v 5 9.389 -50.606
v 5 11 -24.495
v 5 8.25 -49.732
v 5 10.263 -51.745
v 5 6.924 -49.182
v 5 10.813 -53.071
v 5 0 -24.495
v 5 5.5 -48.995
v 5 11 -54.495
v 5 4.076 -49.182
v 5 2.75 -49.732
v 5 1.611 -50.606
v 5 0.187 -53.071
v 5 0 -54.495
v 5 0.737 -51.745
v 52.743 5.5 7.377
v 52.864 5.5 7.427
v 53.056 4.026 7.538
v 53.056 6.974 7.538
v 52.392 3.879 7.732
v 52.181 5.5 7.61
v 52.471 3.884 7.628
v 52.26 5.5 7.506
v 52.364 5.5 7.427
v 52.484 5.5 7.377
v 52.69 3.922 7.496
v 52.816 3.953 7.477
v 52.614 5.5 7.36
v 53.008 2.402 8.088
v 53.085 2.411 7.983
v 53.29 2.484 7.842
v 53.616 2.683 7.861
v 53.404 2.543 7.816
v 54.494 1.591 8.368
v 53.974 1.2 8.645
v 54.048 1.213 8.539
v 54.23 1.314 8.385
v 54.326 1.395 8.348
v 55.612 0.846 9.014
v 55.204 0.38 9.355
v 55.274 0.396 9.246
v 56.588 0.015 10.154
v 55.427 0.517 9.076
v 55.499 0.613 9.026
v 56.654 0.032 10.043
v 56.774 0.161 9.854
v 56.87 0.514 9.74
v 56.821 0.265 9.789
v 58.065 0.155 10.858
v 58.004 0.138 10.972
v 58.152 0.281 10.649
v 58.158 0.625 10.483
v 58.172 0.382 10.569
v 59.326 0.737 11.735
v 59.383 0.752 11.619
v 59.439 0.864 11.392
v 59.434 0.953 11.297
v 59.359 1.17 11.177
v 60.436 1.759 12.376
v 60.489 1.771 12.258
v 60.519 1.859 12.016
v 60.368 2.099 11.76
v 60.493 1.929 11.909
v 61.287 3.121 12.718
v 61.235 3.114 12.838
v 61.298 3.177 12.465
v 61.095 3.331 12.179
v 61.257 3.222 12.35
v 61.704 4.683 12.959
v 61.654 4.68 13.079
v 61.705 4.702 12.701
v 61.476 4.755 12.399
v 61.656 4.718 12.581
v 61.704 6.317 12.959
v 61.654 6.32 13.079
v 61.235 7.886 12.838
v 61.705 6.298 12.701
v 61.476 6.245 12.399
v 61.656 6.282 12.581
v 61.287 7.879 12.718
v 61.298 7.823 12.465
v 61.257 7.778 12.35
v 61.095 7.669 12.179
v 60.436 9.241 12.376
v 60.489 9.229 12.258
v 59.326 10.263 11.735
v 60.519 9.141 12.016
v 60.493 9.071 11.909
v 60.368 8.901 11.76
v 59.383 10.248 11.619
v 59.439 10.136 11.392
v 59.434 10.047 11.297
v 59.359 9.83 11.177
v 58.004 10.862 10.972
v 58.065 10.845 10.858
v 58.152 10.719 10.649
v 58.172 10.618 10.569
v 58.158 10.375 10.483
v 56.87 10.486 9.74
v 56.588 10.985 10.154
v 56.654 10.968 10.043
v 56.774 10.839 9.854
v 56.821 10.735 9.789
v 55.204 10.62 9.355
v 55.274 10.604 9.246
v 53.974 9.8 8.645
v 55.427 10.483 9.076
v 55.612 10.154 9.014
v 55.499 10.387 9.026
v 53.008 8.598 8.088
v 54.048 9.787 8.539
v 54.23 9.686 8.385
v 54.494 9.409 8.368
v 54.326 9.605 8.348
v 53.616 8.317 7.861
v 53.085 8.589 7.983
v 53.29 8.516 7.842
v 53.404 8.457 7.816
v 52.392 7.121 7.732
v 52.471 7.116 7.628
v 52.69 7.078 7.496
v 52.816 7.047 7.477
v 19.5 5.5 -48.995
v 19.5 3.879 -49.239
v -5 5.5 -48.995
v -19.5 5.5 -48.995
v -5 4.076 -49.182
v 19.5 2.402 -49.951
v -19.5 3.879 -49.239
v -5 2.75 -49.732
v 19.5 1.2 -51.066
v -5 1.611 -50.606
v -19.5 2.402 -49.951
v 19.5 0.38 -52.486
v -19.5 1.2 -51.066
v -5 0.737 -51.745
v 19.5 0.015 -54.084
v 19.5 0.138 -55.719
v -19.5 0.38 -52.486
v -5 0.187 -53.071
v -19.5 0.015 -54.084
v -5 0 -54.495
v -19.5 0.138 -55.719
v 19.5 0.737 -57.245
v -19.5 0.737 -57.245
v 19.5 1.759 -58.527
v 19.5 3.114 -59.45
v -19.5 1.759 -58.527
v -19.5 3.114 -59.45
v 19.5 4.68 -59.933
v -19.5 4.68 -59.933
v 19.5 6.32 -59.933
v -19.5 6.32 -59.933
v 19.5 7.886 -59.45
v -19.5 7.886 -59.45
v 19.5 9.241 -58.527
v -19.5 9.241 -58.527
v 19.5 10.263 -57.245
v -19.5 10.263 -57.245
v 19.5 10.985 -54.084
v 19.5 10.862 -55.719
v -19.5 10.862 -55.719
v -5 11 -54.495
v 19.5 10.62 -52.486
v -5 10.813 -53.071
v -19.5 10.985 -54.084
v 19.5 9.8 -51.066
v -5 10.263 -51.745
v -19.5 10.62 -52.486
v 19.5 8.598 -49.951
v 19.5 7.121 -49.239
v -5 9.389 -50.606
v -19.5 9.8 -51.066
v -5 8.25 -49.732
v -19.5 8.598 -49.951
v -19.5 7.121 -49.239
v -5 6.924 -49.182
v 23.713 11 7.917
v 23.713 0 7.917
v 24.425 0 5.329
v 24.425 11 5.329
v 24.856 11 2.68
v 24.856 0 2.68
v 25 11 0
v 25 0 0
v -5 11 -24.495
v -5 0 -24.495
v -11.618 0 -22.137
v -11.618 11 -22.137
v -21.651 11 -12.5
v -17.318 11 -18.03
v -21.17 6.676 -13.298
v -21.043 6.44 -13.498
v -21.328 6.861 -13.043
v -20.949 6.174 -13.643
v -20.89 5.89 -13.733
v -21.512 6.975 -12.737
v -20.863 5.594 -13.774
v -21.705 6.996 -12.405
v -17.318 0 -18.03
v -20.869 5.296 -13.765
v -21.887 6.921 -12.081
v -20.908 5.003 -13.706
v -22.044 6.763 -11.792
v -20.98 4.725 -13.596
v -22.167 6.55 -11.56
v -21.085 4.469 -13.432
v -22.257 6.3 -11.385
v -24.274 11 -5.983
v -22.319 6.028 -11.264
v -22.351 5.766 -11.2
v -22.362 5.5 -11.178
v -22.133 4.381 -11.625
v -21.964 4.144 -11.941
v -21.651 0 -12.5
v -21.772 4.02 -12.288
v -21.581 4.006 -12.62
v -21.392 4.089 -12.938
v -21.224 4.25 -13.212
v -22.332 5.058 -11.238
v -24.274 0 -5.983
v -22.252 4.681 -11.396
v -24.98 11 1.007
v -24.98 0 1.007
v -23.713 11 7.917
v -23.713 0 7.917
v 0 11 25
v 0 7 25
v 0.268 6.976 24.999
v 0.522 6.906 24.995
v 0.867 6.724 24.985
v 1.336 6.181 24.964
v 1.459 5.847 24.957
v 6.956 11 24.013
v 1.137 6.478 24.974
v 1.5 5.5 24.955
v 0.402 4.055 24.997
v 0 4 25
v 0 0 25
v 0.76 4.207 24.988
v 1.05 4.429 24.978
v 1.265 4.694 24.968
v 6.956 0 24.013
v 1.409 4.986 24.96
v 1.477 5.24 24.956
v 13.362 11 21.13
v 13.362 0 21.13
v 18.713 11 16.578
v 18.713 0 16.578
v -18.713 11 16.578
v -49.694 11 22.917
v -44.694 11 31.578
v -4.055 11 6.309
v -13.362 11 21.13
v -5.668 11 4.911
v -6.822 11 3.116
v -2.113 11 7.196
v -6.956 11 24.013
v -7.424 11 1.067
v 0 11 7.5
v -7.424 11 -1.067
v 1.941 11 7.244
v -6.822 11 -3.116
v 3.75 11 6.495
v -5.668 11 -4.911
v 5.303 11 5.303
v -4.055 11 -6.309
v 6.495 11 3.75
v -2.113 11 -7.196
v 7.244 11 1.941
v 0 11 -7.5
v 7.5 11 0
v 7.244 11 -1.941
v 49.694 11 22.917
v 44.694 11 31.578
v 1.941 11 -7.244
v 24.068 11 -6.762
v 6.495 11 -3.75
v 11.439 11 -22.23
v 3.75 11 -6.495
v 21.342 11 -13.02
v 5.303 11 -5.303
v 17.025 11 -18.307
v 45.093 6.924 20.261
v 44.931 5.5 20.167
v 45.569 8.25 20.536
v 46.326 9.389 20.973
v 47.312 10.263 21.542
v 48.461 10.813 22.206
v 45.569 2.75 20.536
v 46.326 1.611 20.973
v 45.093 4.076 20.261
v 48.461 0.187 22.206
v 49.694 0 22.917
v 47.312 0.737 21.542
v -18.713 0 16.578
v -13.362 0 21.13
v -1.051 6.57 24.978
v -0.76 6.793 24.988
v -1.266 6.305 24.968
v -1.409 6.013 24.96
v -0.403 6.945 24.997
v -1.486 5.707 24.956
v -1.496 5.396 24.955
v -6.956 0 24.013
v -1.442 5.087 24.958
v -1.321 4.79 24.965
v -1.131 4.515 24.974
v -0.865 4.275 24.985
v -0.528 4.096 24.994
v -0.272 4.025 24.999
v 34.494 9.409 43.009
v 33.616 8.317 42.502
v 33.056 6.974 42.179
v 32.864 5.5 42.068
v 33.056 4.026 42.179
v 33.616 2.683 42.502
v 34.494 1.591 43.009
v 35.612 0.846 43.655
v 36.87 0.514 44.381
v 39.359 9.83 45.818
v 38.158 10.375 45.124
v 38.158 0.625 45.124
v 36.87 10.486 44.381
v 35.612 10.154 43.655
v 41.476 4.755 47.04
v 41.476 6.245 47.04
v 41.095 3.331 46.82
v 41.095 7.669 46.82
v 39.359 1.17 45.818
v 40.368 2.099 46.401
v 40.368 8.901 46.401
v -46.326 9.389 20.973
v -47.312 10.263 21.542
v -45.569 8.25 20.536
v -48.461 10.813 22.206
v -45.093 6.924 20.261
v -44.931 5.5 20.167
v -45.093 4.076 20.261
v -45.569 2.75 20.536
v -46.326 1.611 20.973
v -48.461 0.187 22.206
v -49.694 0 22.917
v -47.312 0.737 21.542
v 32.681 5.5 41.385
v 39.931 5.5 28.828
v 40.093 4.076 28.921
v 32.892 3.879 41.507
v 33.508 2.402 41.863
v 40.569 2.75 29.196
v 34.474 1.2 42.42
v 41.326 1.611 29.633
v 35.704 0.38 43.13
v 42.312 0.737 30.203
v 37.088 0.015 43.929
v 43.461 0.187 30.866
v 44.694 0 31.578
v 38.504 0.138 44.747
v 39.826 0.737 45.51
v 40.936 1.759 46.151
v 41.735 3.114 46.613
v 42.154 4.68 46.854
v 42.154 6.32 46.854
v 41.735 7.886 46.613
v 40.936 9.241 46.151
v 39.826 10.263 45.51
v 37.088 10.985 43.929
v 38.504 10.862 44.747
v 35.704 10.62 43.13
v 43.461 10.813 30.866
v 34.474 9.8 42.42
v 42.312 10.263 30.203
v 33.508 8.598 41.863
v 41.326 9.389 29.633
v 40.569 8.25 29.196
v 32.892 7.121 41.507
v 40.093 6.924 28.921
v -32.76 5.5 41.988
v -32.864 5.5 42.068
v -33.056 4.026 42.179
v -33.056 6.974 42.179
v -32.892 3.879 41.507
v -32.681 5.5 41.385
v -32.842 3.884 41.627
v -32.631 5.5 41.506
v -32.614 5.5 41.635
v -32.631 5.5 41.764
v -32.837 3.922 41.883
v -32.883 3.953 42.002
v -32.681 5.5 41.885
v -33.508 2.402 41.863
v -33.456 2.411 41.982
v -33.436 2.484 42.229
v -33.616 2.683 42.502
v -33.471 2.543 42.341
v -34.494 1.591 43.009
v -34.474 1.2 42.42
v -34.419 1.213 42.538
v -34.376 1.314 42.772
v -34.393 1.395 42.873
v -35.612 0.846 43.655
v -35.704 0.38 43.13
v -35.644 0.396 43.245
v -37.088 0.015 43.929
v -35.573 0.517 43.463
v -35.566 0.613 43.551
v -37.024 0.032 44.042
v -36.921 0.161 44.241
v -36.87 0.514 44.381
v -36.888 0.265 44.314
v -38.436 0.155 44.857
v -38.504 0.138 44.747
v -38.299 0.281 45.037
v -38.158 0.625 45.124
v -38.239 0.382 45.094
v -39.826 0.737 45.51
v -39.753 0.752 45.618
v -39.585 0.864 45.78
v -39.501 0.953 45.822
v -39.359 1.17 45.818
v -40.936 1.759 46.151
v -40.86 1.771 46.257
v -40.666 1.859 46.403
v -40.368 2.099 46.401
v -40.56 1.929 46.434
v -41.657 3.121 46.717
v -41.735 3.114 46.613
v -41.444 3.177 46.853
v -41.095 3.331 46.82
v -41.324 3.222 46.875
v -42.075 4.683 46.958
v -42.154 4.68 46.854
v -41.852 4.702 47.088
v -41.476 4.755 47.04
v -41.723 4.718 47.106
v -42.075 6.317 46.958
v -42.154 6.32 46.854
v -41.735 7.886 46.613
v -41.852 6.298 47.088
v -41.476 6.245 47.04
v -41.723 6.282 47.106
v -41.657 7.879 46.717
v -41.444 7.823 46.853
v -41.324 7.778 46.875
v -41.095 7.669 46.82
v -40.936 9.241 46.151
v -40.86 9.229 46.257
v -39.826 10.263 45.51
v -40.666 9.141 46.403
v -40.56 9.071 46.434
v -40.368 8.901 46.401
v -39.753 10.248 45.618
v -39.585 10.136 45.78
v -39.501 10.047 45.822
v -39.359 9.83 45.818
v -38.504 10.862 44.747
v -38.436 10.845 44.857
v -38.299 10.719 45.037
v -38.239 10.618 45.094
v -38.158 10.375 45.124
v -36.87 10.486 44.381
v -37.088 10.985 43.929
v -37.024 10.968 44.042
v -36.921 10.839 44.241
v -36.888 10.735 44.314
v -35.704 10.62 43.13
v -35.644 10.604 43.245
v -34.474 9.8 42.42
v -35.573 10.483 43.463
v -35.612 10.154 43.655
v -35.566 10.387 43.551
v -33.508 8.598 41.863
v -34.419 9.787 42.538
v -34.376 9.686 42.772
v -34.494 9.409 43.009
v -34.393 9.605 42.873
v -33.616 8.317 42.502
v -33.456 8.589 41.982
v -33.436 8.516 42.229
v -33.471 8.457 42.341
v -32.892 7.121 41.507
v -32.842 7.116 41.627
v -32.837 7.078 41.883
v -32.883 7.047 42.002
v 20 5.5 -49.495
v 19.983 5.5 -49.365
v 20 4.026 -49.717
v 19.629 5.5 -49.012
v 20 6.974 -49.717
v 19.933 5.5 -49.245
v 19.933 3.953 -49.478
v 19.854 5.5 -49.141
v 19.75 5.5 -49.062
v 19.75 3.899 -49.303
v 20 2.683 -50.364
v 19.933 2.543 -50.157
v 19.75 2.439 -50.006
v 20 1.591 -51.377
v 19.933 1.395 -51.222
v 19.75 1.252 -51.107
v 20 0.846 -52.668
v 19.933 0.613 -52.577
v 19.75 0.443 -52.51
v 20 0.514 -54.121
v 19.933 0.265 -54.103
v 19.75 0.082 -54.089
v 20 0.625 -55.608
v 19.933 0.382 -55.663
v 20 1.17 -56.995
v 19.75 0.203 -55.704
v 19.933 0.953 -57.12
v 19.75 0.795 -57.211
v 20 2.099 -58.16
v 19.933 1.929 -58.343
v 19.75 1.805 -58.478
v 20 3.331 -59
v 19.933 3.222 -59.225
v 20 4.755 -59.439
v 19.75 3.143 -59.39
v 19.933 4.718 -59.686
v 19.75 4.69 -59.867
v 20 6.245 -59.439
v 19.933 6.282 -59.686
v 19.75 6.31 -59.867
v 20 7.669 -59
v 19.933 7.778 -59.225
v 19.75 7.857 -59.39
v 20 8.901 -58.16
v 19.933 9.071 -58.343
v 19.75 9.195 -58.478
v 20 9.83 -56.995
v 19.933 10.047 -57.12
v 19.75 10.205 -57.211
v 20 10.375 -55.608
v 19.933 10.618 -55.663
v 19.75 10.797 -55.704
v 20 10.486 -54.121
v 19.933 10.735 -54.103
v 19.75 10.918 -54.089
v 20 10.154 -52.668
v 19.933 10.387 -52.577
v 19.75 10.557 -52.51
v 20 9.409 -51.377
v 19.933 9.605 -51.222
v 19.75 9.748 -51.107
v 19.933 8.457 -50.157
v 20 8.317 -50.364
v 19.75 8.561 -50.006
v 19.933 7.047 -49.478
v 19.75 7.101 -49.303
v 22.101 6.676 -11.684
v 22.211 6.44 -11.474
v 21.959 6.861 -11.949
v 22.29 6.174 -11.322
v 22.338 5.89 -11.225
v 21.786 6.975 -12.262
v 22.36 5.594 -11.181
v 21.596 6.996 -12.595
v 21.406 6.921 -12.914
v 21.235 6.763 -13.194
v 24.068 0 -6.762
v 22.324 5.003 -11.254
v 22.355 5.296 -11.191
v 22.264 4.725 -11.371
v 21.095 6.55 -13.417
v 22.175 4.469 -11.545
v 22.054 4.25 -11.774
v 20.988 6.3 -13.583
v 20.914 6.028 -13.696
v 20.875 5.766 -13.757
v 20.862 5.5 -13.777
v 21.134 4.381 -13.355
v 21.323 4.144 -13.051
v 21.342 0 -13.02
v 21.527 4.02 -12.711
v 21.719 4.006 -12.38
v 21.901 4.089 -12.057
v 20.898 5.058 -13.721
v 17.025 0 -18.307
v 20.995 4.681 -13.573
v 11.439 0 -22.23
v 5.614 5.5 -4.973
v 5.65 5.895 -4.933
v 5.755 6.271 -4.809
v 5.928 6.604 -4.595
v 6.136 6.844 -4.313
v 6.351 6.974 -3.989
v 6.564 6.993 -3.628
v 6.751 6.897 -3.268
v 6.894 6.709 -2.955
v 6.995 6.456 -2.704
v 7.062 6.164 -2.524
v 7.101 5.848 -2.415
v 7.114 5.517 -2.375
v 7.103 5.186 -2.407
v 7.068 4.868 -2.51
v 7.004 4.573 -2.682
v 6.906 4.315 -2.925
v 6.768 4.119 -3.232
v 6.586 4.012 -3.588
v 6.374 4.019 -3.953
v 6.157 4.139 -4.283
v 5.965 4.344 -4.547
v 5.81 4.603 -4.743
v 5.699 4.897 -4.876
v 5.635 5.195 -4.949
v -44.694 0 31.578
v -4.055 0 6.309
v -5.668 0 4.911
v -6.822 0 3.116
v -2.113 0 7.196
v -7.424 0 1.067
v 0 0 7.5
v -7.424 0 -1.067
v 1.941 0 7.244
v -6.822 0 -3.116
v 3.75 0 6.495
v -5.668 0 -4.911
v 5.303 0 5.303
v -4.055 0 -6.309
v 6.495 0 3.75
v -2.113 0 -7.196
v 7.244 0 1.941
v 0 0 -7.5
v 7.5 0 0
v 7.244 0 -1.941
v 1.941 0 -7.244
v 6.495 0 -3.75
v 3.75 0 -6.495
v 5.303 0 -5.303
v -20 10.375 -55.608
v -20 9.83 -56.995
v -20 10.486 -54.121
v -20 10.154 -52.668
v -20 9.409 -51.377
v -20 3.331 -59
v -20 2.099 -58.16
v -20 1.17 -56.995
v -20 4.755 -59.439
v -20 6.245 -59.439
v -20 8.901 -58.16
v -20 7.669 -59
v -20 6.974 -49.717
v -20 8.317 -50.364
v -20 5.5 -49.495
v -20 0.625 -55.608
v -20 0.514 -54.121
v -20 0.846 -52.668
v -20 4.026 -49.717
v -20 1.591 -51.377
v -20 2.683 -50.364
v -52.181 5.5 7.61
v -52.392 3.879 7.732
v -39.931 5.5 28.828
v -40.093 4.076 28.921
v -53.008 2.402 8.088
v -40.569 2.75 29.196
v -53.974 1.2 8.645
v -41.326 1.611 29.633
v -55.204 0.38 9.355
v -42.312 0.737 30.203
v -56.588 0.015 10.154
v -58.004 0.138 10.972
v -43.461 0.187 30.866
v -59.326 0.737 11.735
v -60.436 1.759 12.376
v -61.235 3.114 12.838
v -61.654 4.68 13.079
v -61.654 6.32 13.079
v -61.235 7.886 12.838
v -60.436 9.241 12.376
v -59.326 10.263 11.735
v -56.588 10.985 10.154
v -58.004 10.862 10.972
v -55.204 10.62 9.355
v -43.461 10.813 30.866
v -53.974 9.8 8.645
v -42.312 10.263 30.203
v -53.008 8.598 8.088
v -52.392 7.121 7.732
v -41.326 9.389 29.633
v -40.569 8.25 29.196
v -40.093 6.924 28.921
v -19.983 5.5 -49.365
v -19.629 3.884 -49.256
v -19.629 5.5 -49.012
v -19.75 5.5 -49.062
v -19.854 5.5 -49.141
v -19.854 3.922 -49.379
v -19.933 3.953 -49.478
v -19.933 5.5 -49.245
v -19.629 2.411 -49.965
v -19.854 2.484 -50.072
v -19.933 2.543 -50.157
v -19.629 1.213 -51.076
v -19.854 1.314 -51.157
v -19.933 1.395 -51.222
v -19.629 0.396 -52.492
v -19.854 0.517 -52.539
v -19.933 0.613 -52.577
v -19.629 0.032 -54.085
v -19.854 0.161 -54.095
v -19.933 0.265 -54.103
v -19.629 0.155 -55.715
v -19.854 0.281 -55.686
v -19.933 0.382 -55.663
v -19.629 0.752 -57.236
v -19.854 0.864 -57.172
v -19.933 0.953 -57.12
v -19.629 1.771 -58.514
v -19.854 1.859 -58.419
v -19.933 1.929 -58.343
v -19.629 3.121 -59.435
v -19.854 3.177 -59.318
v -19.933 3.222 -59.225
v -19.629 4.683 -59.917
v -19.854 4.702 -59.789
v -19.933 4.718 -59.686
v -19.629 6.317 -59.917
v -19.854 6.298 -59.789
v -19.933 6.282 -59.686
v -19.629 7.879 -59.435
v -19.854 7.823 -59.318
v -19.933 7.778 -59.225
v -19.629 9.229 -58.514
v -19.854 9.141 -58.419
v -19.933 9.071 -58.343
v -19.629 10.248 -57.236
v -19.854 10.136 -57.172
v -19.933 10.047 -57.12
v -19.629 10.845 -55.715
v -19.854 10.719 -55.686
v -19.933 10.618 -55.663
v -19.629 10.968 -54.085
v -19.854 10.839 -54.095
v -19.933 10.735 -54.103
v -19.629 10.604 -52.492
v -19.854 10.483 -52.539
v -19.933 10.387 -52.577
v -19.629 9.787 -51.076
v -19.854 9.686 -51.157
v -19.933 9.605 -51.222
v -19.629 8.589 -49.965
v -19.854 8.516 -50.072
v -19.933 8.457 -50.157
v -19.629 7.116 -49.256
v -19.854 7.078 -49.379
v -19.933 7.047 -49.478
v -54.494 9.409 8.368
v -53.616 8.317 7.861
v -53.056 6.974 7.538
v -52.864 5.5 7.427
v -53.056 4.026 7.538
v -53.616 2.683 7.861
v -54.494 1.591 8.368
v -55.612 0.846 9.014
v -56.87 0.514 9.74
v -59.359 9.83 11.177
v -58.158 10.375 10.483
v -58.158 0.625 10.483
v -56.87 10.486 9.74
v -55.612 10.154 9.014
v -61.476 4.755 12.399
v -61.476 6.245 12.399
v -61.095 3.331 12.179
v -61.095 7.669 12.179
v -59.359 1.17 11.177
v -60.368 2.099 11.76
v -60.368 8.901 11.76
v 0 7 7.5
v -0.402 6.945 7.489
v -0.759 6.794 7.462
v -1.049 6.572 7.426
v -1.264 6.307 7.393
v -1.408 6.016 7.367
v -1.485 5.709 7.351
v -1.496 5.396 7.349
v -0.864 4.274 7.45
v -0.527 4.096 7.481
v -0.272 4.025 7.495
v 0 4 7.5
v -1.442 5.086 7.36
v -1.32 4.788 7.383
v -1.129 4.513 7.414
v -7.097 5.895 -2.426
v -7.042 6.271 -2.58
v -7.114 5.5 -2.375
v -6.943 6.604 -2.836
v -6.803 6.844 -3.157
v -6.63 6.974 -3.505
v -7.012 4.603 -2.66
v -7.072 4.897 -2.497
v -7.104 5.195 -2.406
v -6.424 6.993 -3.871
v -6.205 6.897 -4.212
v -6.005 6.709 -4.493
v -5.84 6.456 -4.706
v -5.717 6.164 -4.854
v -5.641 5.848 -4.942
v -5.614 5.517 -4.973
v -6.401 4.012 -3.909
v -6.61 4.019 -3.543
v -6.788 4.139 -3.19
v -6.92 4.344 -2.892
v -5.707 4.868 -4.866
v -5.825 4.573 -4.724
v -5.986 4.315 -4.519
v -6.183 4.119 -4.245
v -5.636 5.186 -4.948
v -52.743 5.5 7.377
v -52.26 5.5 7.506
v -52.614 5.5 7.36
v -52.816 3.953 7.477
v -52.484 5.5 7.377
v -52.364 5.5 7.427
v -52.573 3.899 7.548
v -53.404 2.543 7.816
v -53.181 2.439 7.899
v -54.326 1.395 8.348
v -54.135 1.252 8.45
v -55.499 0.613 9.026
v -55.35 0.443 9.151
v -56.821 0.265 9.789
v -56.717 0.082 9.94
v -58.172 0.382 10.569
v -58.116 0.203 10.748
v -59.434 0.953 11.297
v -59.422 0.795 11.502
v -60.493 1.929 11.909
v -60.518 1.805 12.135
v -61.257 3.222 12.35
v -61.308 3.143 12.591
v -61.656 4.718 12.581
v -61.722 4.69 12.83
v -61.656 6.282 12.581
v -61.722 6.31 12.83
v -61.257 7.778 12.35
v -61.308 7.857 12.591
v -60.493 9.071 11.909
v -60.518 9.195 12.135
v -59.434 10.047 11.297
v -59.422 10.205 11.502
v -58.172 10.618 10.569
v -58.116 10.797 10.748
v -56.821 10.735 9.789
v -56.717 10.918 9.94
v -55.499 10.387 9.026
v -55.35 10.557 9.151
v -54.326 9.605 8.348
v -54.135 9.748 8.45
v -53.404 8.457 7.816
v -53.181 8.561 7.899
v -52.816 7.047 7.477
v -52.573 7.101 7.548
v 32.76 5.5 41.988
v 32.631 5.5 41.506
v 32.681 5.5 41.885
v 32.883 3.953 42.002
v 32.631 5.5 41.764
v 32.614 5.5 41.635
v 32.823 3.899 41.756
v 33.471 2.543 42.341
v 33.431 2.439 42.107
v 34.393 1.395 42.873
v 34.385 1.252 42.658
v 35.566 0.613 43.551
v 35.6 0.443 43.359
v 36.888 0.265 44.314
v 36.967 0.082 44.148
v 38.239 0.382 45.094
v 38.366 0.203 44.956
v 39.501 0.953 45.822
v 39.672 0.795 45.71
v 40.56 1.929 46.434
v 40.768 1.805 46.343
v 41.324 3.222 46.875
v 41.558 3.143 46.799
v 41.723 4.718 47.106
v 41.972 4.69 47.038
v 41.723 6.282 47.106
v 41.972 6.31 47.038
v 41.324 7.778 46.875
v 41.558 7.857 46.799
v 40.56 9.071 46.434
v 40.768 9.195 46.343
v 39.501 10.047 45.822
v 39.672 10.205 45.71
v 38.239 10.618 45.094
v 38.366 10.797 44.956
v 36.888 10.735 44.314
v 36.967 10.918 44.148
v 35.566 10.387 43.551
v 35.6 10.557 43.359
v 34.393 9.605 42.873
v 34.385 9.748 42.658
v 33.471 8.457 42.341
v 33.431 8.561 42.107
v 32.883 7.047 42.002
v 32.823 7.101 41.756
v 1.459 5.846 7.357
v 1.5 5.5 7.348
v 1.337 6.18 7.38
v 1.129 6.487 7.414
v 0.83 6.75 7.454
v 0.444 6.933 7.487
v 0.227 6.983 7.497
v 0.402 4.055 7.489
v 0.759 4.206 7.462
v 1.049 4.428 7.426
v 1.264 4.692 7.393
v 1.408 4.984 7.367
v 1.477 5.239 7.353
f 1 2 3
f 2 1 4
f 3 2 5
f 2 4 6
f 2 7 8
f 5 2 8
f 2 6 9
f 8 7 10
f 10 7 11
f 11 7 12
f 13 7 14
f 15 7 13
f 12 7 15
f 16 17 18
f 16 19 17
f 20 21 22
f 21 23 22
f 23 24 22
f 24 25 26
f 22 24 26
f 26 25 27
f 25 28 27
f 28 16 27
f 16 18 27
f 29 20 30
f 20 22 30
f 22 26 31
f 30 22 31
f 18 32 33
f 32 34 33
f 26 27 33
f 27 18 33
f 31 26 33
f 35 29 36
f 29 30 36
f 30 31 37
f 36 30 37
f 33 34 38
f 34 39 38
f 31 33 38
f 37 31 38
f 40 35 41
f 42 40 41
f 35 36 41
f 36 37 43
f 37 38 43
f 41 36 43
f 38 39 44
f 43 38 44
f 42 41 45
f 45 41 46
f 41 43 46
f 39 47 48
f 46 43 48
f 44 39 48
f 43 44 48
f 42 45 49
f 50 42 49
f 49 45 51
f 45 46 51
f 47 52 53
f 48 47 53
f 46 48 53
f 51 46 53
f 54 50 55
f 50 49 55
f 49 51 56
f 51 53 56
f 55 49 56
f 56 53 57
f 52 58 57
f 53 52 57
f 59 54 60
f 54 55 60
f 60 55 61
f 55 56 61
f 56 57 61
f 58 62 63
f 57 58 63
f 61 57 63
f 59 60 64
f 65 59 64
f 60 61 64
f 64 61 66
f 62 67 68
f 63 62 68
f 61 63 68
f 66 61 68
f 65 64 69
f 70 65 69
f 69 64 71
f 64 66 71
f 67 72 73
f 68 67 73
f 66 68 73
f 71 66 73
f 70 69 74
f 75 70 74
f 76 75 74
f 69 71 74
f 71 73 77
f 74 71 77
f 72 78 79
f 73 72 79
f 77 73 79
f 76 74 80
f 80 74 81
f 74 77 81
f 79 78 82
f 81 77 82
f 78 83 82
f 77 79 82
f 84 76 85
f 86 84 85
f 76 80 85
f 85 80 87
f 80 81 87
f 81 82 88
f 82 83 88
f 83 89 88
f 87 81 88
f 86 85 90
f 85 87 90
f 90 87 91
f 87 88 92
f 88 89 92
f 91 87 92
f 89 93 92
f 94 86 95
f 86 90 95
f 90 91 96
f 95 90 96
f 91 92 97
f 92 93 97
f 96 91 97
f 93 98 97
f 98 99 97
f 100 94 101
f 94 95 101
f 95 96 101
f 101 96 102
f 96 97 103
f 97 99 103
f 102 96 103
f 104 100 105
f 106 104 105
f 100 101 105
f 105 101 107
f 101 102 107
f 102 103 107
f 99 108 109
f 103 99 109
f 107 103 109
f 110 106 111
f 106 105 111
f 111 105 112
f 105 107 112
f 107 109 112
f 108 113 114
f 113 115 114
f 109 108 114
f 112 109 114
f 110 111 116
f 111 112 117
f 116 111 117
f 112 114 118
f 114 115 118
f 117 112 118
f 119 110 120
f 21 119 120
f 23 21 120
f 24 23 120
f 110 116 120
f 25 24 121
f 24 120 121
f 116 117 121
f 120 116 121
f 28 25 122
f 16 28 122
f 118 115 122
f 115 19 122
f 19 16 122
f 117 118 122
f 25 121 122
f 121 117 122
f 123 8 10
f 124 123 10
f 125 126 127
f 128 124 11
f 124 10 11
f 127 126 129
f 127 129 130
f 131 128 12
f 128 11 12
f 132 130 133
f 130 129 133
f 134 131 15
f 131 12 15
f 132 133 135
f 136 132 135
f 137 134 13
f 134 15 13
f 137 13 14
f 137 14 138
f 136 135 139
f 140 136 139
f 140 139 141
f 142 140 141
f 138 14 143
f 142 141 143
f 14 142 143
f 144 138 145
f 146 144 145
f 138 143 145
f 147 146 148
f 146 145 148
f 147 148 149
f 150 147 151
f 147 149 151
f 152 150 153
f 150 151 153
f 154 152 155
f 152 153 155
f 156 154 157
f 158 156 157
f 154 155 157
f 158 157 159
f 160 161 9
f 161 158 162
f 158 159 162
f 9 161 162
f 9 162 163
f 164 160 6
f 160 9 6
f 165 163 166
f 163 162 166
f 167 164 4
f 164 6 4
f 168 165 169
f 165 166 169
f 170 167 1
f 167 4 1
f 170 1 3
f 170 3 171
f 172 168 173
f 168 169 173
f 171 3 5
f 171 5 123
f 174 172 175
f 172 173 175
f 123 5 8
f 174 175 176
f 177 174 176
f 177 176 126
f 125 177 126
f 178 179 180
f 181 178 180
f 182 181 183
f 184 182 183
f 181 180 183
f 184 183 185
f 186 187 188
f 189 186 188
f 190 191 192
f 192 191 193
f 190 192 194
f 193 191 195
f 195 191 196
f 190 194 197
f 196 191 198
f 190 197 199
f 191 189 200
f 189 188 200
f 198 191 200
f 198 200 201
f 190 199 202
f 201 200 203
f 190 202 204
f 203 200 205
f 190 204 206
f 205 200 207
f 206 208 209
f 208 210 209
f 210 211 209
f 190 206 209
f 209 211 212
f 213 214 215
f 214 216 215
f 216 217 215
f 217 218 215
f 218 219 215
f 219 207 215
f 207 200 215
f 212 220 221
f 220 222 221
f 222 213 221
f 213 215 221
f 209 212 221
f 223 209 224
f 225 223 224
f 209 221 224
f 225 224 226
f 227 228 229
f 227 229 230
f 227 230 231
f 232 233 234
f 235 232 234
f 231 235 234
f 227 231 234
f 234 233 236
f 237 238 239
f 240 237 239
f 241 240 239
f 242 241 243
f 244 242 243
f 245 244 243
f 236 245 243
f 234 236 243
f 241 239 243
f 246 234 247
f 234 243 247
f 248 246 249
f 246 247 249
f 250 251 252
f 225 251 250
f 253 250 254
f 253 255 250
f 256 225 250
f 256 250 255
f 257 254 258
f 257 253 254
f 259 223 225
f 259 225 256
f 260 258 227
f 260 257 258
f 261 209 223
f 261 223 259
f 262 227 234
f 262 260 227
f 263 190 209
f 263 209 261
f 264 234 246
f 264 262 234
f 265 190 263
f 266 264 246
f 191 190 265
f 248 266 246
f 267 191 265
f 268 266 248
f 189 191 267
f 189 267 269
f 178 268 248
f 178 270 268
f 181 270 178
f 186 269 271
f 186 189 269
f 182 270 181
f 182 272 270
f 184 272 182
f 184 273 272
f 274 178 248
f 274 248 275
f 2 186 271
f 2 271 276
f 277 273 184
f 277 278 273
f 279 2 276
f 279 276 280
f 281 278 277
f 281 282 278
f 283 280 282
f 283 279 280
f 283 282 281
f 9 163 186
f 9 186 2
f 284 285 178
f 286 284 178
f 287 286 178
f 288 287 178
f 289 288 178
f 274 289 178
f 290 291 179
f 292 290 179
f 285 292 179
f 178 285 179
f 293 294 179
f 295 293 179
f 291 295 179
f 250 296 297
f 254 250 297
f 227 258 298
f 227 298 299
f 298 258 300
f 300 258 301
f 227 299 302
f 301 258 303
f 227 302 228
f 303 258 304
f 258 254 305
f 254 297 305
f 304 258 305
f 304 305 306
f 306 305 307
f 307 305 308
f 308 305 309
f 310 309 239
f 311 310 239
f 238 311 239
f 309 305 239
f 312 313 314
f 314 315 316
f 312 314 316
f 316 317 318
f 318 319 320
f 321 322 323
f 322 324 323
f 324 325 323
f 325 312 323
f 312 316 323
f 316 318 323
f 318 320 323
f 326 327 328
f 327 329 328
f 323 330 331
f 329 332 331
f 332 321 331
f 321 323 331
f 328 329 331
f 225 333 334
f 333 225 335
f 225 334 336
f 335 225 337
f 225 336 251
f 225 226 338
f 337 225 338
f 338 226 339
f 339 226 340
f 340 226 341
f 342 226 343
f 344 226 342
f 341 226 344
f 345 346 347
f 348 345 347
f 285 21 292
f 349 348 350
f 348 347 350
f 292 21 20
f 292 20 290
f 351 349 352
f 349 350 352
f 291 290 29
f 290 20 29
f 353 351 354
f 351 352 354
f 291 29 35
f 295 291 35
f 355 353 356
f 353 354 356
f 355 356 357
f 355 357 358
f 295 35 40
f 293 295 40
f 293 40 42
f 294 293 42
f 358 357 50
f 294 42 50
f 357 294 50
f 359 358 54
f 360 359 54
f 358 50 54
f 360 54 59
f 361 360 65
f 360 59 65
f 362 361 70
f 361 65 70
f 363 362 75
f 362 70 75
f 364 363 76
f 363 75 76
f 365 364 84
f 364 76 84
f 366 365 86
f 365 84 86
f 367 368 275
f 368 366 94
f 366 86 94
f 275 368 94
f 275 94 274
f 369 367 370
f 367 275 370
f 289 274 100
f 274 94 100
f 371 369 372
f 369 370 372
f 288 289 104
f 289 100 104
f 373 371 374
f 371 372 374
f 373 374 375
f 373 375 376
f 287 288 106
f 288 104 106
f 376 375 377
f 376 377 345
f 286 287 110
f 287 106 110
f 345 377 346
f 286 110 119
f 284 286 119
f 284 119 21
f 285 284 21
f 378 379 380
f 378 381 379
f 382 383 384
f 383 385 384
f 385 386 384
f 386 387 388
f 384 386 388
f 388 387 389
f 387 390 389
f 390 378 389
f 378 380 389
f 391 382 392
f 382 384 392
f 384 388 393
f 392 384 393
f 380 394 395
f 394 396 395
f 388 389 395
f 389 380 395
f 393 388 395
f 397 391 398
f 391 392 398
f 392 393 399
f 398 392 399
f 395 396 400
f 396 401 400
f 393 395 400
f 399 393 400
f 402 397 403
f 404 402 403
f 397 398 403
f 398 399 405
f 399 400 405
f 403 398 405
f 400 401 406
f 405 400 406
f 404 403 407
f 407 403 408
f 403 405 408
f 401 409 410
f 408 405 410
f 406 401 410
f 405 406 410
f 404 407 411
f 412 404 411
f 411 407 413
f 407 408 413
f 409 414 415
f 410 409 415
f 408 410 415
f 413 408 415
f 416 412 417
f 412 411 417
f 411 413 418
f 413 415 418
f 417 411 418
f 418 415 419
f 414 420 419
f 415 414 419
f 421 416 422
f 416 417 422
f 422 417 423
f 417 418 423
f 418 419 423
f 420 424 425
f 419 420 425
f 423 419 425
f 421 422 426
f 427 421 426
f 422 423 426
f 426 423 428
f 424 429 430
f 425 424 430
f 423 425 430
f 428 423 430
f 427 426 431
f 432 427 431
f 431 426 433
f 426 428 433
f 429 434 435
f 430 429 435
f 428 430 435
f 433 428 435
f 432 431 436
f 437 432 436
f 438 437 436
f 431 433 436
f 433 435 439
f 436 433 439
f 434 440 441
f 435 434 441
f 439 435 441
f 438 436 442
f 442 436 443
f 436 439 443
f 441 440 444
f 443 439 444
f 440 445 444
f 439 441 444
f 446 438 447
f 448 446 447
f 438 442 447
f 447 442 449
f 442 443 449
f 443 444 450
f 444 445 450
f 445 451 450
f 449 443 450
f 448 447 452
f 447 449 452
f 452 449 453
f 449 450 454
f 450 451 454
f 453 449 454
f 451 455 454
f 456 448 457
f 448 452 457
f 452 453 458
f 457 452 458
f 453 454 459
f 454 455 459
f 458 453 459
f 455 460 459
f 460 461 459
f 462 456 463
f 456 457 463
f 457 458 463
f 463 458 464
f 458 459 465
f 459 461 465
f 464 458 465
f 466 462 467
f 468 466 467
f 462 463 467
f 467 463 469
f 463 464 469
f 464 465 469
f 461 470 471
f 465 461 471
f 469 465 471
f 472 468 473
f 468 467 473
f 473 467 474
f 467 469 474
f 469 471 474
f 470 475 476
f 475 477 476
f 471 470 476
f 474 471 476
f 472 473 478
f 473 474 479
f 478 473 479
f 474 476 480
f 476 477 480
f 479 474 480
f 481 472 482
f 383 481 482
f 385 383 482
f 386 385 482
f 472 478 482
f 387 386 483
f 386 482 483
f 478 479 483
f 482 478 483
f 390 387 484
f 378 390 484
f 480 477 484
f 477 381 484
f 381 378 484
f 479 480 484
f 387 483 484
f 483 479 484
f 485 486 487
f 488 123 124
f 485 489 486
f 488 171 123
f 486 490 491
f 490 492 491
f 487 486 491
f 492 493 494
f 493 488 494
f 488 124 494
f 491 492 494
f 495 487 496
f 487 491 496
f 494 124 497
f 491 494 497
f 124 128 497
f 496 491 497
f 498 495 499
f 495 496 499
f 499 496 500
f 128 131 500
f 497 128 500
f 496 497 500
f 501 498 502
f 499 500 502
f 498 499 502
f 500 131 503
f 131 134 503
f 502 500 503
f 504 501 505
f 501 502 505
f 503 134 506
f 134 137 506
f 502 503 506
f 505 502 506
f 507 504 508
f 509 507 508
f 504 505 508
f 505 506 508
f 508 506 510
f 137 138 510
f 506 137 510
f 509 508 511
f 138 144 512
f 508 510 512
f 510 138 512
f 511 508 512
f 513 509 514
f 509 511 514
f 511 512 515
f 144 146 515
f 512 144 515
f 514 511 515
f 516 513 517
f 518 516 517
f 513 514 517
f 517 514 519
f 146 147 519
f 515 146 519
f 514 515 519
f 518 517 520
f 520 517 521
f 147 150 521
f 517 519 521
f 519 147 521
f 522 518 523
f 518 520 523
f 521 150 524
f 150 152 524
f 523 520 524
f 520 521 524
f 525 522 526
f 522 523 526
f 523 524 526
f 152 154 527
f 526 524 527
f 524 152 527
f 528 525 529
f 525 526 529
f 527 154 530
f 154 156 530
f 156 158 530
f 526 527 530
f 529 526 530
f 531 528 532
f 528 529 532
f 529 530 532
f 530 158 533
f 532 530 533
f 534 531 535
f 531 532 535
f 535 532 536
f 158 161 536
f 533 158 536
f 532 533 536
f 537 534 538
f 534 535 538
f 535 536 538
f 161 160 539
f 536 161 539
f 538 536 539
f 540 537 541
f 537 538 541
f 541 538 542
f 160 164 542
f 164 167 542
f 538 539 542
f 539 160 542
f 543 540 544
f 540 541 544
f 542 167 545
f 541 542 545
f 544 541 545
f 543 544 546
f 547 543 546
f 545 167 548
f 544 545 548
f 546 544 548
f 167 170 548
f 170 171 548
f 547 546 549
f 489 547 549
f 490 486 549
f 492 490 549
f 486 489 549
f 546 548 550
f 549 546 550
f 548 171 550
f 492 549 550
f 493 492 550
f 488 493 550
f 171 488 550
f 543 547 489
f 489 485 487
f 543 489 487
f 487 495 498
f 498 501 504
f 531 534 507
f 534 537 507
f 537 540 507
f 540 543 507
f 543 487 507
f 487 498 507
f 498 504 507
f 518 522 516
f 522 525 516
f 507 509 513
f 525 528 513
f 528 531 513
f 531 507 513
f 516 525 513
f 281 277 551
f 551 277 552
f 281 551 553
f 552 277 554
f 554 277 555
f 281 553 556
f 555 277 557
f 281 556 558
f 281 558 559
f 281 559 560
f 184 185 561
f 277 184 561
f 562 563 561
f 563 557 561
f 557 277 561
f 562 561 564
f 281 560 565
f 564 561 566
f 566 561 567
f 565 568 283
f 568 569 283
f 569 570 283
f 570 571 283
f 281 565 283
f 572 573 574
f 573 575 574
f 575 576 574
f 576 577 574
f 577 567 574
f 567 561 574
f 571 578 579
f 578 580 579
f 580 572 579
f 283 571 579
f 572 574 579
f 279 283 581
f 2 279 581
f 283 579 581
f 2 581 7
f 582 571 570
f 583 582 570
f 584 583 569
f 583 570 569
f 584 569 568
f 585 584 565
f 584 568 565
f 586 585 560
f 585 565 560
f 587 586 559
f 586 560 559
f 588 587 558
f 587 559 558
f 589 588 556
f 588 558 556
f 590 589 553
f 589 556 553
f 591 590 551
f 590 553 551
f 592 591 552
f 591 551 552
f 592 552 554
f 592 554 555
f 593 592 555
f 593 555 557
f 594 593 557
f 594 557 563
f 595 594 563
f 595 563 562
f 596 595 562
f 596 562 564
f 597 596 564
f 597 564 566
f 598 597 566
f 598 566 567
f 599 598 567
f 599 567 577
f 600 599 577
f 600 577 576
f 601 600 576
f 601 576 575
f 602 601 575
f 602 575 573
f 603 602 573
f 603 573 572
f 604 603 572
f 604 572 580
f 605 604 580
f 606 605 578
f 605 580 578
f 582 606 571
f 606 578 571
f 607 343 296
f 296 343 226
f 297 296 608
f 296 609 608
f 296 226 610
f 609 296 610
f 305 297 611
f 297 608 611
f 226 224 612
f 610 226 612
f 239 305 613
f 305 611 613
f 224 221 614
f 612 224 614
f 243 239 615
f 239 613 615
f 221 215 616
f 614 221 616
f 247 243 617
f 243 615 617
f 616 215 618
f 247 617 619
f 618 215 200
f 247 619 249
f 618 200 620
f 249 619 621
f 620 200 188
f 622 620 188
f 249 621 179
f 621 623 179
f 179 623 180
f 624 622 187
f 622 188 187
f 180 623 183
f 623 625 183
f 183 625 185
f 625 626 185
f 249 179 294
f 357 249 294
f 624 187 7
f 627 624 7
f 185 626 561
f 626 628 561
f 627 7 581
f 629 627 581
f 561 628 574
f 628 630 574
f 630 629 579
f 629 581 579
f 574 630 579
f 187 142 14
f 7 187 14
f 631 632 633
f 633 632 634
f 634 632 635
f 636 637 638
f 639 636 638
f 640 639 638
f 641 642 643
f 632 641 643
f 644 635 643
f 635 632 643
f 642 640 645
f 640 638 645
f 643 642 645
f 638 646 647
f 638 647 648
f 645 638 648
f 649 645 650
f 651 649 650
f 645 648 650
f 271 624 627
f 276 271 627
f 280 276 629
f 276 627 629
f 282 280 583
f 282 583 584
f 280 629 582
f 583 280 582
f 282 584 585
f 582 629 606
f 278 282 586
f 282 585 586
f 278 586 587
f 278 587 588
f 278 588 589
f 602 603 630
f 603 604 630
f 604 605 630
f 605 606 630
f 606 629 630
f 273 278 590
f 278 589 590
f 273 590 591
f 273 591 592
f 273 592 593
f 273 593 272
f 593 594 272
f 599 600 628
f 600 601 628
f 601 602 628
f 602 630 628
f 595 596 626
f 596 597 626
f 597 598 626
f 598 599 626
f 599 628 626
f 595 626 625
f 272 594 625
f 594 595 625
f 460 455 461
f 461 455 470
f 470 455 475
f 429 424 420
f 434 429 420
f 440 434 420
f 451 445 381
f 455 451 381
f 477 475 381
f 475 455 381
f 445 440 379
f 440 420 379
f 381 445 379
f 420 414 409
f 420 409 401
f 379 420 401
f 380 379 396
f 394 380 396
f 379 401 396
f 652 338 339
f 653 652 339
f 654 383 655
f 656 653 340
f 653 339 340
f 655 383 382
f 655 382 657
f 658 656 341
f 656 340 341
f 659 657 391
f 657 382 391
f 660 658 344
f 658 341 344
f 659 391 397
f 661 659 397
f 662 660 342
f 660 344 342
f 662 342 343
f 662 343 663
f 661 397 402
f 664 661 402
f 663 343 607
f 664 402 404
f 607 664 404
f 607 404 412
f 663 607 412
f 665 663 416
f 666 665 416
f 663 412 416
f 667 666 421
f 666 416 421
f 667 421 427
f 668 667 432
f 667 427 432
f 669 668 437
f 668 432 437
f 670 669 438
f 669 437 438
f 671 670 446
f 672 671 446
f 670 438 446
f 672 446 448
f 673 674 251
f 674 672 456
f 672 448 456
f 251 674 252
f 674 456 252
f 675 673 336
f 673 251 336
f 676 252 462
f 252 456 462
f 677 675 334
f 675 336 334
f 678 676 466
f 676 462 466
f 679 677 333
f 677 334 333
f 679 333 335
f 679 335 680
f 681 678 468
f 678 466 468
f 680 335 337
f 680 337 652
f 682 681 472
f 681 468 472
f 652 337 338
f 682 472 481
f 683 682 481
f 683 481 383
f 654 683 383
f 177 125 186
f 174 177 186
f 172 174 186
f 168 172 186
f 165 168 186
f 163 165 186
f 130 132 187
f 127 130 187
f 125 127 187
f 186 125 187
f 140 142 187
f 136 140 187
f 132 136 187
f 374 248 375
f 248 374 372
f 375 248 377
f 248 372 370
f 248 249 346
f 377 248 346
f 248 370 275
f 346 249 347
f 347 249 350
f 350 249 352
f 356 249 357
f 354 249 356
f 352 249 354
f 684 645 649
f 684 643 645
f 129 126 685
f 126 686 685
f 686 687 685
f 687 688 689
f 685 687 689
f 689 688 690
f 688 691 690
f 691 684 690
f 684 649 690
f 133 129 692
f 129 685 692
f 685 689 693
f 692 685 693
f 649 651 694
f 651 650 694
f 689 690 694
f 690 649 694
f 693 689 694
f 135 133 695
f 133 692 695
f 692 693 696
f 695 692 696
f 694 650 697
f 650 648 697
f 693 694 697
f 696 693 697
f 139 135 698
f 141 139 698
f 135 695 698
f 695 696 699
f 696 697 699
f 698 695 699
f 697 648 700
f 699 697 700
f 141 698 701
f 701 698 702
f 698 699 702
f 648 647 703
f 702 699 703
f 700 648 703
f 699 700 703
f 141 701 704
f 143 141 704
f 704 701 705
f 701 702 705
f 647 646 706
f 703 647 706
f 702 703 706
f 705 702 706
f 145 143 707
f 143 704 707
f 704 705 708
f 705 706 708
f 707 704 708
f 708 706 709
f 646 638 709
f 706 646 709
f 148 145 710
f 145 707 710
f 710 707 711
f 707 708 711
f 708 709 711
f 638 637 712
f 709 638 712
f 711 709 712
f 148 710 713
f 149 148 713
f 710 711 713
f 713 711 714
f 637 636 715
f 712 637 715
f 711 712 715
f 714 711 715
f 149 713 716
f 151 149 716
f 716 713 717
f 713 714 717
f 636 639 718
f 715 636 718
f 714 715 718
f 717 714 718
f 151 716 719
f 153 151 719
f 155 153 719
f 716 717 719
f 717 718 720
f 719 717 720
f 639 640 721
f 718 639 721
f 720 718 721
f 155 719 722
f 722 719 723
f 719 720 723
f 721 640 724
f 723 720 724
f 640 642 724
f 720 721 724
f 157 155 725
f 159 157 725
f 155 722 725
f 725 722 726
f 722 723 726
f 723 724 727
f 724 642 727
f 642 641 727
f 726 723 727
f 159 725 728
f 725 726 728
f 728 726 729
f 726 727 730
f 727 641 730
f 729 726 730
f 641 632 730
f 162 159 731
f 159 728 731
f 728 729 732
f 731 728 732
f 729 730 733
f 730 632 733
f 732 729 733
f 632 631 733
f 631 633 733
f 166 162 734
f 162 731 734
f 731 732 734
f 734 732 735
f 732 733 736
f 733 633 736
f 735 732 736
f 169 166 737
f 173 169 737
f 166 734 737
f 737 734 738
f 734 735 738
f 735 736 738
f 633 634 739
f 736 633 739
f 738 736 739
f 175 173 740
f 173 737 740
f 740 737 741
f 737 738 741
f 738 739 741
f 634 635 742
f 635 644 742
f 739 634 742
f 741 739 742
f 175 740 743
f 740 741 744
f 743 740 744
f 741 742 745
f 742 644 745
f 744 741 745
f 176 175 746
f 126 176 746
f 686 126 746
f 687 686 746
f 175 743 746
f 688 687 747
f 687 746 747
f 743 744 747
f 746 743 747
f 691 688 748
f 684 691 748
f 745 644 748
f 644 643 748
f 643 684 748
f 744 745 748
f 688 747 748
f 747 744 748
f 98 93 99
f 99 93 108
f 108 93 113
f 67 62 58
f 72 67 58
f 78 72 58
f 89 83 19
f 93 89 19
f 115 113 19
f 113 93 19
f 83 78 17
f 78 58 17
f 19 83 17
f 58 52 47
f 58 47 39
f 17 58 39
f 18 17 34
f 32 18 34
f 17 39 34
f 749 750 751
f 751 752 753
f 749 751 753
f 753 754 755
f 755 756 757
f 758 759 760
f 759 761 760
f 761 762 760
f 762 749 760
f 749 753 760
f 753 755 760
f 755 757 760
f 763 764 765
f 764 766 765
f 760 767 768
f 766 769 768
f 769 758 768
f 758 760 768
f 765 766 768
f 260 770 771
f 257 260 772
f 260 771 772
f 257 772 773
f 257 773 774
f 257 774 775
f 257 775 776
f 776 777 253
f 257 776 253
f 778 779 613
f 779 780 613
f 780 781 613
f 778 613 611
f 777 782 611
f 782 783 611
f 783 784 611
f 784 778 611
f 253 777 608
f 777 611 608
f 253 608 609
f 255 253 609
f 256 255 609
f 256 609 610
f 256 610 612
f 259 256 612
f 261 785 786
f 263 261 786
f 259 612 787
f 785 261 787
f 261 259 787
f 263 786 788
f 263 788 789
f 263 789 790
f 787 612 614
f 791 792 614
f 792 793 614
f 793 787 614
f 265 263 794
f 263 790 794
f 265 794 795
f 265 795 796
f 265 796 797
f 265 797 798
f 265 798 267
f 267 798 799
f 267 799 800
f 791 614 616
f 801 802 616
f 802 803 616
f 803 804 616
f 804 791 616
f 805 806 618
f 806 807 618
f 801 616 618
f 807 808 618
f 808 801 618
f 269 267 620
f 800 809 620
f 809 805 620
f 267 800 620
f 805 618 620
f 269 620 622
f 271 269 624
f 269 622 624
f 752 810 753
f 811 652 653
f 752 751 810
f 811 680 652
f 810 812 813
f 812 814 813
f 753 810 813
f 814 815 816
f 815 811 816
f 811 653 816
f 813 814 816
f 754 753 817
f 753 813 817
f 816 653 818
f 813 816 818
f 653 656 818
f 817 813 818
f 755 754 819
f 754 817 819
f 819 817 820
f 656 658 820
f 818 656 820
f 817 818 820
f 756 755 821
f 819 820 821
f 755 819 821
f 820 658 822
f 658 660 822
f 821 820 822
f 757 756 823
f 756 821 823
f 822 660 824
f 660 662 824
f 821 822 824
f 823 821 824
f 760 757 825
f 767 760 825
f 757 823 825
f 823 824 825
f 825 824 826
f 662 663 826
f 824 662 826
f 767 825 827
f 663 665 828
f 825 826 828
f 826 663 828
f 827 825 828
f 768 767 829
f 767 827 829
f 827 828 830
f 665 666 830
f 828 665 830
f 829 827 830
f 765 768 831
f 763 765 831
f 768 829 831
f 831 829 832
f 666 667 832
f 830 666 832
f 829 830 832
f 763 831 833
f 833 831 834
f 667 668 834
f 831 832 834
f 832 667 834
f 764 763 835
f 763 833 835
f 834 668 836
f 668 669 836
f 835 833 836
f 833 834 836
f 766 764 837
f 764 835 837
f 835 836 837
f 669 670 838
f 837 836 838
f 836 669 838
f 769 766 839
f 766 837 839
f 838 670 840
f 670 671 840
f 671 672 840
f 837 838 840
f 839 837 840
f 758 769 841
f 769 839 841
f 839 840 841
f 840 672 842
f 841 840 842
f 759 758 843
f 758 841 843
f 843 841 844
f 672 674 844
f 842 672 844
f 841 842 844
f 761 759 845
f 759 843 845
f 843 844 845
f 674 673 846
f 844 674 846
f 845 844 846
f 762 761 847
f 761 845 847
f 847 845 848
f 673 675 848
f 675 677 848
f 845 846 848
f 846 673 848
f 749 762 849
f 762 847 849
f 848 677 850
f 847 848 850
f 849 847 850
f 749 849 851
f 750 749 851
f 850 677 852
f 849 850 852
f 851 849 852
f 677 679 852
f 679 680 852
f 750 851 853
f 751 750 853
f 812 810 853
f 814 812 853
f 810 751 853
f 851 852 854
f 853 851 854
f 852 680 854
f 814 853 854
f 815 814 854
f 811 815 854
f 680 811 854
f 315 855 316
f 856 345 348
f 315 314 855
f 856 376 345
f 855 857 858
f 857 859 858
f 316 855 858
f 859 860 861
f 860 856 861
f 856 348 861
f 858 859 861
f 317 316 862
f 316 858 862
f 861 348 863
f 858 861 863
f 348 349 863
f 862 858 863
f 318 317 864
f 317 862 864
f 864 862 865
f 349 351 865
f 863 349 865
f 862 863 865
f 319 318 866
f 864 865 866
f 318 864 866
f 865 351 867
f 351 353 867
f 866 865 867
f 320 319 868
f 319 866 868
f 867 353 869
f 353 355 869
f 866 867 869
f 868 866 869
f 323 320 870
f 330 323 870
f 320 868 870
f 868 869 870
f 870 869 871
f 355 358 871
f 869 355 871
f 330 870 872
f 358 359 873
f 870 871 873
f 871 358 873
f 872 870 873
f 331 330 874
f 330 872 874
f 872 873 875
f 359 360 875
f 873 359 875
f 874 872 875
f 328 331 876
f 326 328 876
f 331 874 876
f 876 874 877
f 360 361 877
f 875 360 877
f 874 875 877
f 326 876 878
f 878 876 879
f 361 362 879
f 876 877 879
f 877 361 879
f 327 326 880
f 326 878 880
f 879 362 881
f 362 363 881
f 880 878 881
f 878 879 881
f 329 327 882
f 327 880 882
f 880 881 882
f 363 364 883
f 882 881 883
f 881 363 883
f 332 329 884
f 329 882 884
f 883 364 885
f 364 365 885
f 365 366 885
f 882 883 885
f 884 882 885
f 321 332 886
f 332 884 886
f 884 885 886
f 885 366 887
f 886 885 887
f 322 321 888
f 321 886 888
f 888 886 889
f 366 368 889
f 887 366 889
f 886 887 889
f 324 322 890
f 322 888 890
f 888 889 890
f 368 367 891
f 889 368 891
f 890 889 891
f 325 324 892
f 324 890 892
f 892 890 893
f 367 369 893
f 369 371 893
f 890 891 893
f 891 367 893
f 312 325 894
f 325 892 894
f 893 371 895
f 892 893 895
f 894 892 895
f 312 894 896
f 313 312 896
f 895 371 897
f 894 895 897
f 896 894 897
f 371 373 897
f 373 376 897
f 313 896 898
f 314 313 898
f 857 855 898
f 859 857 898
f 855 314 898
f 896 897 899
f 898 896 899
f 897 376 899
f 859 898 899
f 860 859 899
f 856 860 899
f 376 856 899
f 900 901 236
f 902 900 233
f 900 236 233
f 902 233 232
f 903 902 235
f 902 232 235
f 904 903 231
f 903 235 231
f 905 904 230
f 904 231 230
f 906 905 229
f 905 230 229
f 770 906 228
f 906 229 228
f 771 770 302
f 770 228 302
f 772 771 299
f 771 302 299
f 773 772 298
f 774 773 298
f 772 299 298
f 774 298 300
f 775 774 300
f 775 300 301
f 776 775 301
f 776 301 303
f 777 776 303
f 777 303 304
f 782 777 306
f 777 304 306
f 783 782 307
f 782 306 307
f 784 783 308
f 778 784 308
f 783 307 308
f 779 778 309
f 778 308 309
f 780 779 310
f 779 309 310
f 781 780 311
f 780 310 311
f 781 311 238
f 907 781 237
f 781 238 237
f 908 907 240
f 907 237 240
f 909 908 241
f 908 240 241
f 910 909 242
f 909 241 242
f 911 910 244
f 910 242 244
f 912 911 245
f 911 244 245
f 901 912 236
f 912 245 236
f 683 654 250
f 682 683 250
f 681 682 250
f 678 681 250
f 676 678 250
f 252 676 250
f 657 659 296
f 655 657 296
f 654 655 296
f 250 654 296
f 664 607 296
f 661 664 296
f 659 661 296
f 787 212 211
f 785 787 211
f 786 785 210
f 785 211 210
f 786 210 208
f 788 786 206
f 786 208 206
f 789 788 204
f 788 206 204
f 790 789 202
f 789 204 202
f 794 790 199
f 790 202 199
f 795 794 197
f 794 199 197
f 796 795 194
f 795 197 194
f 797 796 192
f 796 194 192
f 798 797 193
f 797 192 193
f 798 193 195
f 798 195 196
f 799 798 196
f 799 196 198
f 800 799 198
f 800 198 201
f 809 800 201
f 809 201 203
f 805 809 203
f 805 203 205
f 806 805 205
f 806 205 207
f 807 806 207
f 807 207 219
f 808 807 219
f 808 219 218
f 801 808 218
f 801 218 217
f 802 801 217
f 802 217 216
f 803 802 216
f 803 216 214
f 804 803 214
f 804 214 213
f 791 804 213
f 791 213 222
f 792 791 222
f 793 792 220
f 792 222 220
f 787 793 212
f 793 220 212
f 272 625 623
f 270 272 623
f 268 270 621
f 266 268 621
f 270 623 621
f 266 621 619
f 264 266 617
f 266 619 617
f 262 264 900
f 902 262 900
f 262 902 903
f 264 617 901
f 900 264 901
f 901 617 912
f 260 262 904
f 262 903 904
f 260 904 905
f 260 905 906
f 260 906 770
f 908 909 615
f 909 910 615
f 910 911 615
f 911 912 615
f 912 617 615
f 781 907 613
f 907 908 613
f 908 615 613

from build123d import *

# Parameters (mm, degrees)
BOSS_EXTRUDE1_DEPTH = 11
CIRPATTERN1_COUNT   = 3
SKETCH4_R           = 1.5
CUT_EXTRUDE1_DEPTH  = 20
CIRPATTERN3_COUNT   = 3


with BuildPart() as part:
    # Sketch1 → Boss-Extrude1 (new body)
    with BuildSketch(Plane(origin=(0, 0, 0), x_dir=(1, 0, 0), z_dir=(0, 1, 0))):
        with BuildLine():
            ThreePointArc((5, 24.494897428), (2.51272405, 24.873403825), (0, 25))
            Line((0, 25), (0, 7.5))
            ThreePointArc((0, 7.5), (5.303300859, 5.303300859), (7.5, 0))
            ThreePointArc((7.5, 0), (5.303300859, -5.303300859), (0, -7.5))
            Line((0, -7.5), (0, -25))
            ThreePointArc((0, -25), (10.260619052, -22.797361616), (18.713203436, -16.577575733))
            ThreePointArc((18.713203436, -16.577575733), (21.650635095, -12.5), (23.713203436, -7.917321695))
            ThreePointArc((23.713203436, -7.917321695), (24.676203982, -4.010605572), (25, 0))
            ThreePointArc((25, 0), (19.364916731, 15.811388301), (5, 24.494897428))
        make_face()
        with BuildLine():
            Line((0, 7.5), (0, 25))
            ThreePointArc((0, 25), (-2.51272405, 24.873403825), (-5, 24.494897428))
            ThreePointArc((-5, 24.494897428), (-21.650635095, 12.5), (-23.713203436, -7.917321695))
            ThreePointArc((-23.713203436, -7.917321695), (-21.650635095, -12.5), (-18.713203436, -16.577575733))
            ThreePointArc((-18.713203436, -16.577575733), (-10.260619052, -22.797361616), (0, -25))
            Line((0, -25), (0, -7.5))
            ThreePointArc((0, -7.5), (-7.5, 0), (0, 7.5))
        make_face()
        with BuildLine():
            Line((5, 54.494897428), (0, 54.494897428))
            Line((0, 54.494897428), (0, 25))
            ThreePointArc((0, 25), (2.51272405, 24.873403825), (5, 24.494897428))
            Line((5, 24.494897428), (5, 54.494897428))
        make_face()
        with BuildLine():
            Line((0, 25), (0, 54.494897428))
            Line((0, 54.494897428), (-5, 54.494897428))
            Line((-5, 54.494897428), (-5, 24.494897428))
            ThreePointArc((-5, 24.494897428), (-2.51272405, 24.873403825), (0, 25))
        make_face()
        with BuildLine():
            Line((49.693965549, -22.917321695), (23.713203436, -7.917321695))
            ThreePointArc((23.713203436, -7.917321695), (21.650635095, -12.5), (18.713203436, -16.577575733))
            Line((18.713203436, -16.577575733), (44.693965549, -31.577575733))
            Line((44.693965549, -31.577575733), (49.693965549, -22.917321695))
        make_face()
        with BuildLine():
            ThreePointArc((-18.713203436, -16.577575733), (-21.650635095, -12.5), (-23.713203436, -7.917321695))
            Line((-23.713203436, -7.917321695), (-49.693965549, -22.917321695))
            Line((-49.693965549, -22.917321695), (-44.693965549, -31.577575733))
            Line((-44.693965549, -31.577575733), (-18.713203436, -16.577575733))
        make_face()
    extrude(amount=BOSS_EXTRUDE1_DEPTH)

    # Sketch2 → Revolve1 (revolve)
    with BuildSketch(Plane(origin=(47.193965549, 0, 27.247448714), x_dir=(0.5000000000000038, 0, -0.8660254037844366), z_dir=(0.8660254037844365, 0, 0.5000000000000037)), mode=Mode.PRIVATE) as revolve1_sk:
        with BuildLine():
            Line((-19.5, 0), (19.5, 0))
            ThreePointArc((19.5, 0), (19.853553391, 0.146446609), (20, 0.5))
            Line((20, 0.5), (20, 5.5))
            Line((20, 5.5), (-20, 5.5))
            Line((-20, 5.5), (-20, 0.5))
            ThreePointArc((-20, 0.5), (-19.853553391, 0.146446609), (-19.5, 0))
        make_face()
    revolve1 = revolve(revolve1_sk.sketch.rotate(Axis((57.193965549, 5.5, 9.926940638), (-0.5000000000000036, 0, 0.8660254037844366)), 270), axis=Axis((57.193965549, 5.5, 9.926940638), (-0.5000000000000036, 0, 0.8660254037844366)))

    # CirPattern1: Revolve1 ×3 about axis
    cirpattern1_axis = Axis((0, 0, 0), (0, 1, 0))
    for i in range(1, CIRPATTERN1_COUNT):
        add(revolve1.rotate(cirpattern1_axis, i * 360 / CIRPATTERN1_COUNT))

    # Sketch4 → Cut-Extrude1 (cut)
    with BuildSketch(Plane.XY.offset(25)):
        with Locations((0, 5.5)):
            Circle(SKETCH4_R)
    cut_extrude1 = extrude(amount=-CUT_EXTRUDE1_DEPTH, mode=Mode.SUBTRACT)

    # CirPattern3: Cut-Extrude1 ×3 about axis
    cirpattern3_axis = Axis((0, 11, 0), (0, 1, 0))
    for i in range(1, CIRPATTERN3_COUNT):
        add(cut_extrude1.rotate(cirpattern3_axis, i * 360 / CIRPATTERN3_COUNT), mode=Mode.SUBTRACT)


solid = part.part
